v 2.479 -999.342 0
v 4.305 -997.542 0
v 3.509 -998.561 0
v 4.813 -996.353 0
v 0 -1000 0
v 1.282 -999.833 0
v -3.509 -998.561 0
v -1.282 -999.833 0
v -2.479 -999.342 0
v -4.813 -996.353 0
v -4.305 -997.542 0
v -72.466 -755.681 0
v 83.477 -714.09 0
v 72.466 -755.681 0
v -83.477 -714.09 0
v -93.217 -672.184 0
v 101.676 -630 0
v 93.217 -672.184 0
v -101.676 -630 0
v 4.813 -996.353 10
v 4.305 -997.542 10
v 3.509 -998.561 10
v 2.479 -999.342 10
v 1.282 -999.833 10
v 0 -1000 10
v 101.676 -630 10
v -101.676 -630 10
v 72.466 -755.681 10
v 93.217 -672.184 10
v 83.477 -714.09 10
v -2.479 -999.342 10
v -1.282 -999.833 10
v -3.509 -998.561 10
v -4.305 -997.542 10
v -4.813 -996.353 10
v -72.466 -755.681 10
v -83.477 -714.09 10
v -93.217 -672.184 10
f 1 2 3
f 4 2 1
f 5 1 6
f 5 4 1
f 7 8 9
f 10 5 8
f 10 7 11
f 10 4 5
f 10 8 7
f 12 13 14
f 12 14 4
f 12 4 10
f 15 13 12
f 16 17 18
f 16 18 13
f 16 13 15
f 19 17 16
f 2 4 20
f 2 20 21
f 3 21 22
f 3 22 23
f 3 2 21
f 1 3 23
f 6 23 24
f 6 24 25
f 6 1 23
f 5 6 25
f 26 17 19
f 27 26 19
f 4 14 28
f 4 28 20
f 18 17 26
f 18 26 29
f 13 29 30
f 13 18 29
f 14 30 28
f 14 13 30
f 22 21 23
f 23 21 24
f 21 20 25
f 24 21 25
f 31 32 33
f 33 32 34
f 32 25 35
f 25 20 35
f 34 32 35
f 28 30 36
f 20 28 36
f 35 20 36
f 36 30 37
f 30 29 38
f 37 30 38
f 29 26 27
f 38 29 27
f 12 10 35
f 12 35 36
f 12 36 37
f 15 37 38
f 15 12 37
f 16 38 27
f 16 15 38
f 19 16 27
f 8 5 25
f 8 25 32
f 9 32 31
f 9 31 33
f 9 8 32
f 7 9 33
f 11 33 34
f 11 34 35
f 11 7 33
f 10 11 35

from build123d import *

# Parameters (mm, degrees)
BOSS_EXTRUDE1_DEPTH = 10
SKETCH4_W           = 250.383382942
SKETCH4_H           = 630
CUT_EXTRUDE2_DEPTH  = 1008.855624389


with BuildPart() as part:
    # Sketch2 → Boss-Extrude1 (new body)
    with BuildSketch(Plane.XY):
        with BuildLine():
            Line((-75, 0), (75, 0))
            ThreePointArc((75, 0), (125.183748831, -378.01295639), (72.466338168, -755.680903745))
            Line((72.466338168, -755.680903745), (4.813443083, -996.353057902))
            ThreePointArc((4.813443083, -996.353057902), (3.01949586, -998.985303596), (0, -1000))
            ThreePointArc((0, -1000), (-3.01949586, -998.985303596), (-4.813443083, -996.353057902))
            Line((-4.813443083, -996.353057902), (-72.466338168, -755.680903745))
            ThreePointArc((-72.466338168, -755.680903745), (-125.183748831, -378.01295639), (-75, 0))
        make_face()
    extrude(amount=BOSS_EXTRUDE1_DEPTH)

    # Sketch4 → Cut-Extrude2 (cut, through all)
    with BuildSketch(Plane(origin=(0, 0, 0), x_dir=(-1, 0, 0), z_dir=(0, 0, -1))):
        with Locations((0, -315)):
            Rectangle(SKETCH4_W, SKETCH4_H)
    extrude(amount=-CUT_EXTRUDE2_DEPTH, mode=Mode.SUBTRACT)


solid = part.part
